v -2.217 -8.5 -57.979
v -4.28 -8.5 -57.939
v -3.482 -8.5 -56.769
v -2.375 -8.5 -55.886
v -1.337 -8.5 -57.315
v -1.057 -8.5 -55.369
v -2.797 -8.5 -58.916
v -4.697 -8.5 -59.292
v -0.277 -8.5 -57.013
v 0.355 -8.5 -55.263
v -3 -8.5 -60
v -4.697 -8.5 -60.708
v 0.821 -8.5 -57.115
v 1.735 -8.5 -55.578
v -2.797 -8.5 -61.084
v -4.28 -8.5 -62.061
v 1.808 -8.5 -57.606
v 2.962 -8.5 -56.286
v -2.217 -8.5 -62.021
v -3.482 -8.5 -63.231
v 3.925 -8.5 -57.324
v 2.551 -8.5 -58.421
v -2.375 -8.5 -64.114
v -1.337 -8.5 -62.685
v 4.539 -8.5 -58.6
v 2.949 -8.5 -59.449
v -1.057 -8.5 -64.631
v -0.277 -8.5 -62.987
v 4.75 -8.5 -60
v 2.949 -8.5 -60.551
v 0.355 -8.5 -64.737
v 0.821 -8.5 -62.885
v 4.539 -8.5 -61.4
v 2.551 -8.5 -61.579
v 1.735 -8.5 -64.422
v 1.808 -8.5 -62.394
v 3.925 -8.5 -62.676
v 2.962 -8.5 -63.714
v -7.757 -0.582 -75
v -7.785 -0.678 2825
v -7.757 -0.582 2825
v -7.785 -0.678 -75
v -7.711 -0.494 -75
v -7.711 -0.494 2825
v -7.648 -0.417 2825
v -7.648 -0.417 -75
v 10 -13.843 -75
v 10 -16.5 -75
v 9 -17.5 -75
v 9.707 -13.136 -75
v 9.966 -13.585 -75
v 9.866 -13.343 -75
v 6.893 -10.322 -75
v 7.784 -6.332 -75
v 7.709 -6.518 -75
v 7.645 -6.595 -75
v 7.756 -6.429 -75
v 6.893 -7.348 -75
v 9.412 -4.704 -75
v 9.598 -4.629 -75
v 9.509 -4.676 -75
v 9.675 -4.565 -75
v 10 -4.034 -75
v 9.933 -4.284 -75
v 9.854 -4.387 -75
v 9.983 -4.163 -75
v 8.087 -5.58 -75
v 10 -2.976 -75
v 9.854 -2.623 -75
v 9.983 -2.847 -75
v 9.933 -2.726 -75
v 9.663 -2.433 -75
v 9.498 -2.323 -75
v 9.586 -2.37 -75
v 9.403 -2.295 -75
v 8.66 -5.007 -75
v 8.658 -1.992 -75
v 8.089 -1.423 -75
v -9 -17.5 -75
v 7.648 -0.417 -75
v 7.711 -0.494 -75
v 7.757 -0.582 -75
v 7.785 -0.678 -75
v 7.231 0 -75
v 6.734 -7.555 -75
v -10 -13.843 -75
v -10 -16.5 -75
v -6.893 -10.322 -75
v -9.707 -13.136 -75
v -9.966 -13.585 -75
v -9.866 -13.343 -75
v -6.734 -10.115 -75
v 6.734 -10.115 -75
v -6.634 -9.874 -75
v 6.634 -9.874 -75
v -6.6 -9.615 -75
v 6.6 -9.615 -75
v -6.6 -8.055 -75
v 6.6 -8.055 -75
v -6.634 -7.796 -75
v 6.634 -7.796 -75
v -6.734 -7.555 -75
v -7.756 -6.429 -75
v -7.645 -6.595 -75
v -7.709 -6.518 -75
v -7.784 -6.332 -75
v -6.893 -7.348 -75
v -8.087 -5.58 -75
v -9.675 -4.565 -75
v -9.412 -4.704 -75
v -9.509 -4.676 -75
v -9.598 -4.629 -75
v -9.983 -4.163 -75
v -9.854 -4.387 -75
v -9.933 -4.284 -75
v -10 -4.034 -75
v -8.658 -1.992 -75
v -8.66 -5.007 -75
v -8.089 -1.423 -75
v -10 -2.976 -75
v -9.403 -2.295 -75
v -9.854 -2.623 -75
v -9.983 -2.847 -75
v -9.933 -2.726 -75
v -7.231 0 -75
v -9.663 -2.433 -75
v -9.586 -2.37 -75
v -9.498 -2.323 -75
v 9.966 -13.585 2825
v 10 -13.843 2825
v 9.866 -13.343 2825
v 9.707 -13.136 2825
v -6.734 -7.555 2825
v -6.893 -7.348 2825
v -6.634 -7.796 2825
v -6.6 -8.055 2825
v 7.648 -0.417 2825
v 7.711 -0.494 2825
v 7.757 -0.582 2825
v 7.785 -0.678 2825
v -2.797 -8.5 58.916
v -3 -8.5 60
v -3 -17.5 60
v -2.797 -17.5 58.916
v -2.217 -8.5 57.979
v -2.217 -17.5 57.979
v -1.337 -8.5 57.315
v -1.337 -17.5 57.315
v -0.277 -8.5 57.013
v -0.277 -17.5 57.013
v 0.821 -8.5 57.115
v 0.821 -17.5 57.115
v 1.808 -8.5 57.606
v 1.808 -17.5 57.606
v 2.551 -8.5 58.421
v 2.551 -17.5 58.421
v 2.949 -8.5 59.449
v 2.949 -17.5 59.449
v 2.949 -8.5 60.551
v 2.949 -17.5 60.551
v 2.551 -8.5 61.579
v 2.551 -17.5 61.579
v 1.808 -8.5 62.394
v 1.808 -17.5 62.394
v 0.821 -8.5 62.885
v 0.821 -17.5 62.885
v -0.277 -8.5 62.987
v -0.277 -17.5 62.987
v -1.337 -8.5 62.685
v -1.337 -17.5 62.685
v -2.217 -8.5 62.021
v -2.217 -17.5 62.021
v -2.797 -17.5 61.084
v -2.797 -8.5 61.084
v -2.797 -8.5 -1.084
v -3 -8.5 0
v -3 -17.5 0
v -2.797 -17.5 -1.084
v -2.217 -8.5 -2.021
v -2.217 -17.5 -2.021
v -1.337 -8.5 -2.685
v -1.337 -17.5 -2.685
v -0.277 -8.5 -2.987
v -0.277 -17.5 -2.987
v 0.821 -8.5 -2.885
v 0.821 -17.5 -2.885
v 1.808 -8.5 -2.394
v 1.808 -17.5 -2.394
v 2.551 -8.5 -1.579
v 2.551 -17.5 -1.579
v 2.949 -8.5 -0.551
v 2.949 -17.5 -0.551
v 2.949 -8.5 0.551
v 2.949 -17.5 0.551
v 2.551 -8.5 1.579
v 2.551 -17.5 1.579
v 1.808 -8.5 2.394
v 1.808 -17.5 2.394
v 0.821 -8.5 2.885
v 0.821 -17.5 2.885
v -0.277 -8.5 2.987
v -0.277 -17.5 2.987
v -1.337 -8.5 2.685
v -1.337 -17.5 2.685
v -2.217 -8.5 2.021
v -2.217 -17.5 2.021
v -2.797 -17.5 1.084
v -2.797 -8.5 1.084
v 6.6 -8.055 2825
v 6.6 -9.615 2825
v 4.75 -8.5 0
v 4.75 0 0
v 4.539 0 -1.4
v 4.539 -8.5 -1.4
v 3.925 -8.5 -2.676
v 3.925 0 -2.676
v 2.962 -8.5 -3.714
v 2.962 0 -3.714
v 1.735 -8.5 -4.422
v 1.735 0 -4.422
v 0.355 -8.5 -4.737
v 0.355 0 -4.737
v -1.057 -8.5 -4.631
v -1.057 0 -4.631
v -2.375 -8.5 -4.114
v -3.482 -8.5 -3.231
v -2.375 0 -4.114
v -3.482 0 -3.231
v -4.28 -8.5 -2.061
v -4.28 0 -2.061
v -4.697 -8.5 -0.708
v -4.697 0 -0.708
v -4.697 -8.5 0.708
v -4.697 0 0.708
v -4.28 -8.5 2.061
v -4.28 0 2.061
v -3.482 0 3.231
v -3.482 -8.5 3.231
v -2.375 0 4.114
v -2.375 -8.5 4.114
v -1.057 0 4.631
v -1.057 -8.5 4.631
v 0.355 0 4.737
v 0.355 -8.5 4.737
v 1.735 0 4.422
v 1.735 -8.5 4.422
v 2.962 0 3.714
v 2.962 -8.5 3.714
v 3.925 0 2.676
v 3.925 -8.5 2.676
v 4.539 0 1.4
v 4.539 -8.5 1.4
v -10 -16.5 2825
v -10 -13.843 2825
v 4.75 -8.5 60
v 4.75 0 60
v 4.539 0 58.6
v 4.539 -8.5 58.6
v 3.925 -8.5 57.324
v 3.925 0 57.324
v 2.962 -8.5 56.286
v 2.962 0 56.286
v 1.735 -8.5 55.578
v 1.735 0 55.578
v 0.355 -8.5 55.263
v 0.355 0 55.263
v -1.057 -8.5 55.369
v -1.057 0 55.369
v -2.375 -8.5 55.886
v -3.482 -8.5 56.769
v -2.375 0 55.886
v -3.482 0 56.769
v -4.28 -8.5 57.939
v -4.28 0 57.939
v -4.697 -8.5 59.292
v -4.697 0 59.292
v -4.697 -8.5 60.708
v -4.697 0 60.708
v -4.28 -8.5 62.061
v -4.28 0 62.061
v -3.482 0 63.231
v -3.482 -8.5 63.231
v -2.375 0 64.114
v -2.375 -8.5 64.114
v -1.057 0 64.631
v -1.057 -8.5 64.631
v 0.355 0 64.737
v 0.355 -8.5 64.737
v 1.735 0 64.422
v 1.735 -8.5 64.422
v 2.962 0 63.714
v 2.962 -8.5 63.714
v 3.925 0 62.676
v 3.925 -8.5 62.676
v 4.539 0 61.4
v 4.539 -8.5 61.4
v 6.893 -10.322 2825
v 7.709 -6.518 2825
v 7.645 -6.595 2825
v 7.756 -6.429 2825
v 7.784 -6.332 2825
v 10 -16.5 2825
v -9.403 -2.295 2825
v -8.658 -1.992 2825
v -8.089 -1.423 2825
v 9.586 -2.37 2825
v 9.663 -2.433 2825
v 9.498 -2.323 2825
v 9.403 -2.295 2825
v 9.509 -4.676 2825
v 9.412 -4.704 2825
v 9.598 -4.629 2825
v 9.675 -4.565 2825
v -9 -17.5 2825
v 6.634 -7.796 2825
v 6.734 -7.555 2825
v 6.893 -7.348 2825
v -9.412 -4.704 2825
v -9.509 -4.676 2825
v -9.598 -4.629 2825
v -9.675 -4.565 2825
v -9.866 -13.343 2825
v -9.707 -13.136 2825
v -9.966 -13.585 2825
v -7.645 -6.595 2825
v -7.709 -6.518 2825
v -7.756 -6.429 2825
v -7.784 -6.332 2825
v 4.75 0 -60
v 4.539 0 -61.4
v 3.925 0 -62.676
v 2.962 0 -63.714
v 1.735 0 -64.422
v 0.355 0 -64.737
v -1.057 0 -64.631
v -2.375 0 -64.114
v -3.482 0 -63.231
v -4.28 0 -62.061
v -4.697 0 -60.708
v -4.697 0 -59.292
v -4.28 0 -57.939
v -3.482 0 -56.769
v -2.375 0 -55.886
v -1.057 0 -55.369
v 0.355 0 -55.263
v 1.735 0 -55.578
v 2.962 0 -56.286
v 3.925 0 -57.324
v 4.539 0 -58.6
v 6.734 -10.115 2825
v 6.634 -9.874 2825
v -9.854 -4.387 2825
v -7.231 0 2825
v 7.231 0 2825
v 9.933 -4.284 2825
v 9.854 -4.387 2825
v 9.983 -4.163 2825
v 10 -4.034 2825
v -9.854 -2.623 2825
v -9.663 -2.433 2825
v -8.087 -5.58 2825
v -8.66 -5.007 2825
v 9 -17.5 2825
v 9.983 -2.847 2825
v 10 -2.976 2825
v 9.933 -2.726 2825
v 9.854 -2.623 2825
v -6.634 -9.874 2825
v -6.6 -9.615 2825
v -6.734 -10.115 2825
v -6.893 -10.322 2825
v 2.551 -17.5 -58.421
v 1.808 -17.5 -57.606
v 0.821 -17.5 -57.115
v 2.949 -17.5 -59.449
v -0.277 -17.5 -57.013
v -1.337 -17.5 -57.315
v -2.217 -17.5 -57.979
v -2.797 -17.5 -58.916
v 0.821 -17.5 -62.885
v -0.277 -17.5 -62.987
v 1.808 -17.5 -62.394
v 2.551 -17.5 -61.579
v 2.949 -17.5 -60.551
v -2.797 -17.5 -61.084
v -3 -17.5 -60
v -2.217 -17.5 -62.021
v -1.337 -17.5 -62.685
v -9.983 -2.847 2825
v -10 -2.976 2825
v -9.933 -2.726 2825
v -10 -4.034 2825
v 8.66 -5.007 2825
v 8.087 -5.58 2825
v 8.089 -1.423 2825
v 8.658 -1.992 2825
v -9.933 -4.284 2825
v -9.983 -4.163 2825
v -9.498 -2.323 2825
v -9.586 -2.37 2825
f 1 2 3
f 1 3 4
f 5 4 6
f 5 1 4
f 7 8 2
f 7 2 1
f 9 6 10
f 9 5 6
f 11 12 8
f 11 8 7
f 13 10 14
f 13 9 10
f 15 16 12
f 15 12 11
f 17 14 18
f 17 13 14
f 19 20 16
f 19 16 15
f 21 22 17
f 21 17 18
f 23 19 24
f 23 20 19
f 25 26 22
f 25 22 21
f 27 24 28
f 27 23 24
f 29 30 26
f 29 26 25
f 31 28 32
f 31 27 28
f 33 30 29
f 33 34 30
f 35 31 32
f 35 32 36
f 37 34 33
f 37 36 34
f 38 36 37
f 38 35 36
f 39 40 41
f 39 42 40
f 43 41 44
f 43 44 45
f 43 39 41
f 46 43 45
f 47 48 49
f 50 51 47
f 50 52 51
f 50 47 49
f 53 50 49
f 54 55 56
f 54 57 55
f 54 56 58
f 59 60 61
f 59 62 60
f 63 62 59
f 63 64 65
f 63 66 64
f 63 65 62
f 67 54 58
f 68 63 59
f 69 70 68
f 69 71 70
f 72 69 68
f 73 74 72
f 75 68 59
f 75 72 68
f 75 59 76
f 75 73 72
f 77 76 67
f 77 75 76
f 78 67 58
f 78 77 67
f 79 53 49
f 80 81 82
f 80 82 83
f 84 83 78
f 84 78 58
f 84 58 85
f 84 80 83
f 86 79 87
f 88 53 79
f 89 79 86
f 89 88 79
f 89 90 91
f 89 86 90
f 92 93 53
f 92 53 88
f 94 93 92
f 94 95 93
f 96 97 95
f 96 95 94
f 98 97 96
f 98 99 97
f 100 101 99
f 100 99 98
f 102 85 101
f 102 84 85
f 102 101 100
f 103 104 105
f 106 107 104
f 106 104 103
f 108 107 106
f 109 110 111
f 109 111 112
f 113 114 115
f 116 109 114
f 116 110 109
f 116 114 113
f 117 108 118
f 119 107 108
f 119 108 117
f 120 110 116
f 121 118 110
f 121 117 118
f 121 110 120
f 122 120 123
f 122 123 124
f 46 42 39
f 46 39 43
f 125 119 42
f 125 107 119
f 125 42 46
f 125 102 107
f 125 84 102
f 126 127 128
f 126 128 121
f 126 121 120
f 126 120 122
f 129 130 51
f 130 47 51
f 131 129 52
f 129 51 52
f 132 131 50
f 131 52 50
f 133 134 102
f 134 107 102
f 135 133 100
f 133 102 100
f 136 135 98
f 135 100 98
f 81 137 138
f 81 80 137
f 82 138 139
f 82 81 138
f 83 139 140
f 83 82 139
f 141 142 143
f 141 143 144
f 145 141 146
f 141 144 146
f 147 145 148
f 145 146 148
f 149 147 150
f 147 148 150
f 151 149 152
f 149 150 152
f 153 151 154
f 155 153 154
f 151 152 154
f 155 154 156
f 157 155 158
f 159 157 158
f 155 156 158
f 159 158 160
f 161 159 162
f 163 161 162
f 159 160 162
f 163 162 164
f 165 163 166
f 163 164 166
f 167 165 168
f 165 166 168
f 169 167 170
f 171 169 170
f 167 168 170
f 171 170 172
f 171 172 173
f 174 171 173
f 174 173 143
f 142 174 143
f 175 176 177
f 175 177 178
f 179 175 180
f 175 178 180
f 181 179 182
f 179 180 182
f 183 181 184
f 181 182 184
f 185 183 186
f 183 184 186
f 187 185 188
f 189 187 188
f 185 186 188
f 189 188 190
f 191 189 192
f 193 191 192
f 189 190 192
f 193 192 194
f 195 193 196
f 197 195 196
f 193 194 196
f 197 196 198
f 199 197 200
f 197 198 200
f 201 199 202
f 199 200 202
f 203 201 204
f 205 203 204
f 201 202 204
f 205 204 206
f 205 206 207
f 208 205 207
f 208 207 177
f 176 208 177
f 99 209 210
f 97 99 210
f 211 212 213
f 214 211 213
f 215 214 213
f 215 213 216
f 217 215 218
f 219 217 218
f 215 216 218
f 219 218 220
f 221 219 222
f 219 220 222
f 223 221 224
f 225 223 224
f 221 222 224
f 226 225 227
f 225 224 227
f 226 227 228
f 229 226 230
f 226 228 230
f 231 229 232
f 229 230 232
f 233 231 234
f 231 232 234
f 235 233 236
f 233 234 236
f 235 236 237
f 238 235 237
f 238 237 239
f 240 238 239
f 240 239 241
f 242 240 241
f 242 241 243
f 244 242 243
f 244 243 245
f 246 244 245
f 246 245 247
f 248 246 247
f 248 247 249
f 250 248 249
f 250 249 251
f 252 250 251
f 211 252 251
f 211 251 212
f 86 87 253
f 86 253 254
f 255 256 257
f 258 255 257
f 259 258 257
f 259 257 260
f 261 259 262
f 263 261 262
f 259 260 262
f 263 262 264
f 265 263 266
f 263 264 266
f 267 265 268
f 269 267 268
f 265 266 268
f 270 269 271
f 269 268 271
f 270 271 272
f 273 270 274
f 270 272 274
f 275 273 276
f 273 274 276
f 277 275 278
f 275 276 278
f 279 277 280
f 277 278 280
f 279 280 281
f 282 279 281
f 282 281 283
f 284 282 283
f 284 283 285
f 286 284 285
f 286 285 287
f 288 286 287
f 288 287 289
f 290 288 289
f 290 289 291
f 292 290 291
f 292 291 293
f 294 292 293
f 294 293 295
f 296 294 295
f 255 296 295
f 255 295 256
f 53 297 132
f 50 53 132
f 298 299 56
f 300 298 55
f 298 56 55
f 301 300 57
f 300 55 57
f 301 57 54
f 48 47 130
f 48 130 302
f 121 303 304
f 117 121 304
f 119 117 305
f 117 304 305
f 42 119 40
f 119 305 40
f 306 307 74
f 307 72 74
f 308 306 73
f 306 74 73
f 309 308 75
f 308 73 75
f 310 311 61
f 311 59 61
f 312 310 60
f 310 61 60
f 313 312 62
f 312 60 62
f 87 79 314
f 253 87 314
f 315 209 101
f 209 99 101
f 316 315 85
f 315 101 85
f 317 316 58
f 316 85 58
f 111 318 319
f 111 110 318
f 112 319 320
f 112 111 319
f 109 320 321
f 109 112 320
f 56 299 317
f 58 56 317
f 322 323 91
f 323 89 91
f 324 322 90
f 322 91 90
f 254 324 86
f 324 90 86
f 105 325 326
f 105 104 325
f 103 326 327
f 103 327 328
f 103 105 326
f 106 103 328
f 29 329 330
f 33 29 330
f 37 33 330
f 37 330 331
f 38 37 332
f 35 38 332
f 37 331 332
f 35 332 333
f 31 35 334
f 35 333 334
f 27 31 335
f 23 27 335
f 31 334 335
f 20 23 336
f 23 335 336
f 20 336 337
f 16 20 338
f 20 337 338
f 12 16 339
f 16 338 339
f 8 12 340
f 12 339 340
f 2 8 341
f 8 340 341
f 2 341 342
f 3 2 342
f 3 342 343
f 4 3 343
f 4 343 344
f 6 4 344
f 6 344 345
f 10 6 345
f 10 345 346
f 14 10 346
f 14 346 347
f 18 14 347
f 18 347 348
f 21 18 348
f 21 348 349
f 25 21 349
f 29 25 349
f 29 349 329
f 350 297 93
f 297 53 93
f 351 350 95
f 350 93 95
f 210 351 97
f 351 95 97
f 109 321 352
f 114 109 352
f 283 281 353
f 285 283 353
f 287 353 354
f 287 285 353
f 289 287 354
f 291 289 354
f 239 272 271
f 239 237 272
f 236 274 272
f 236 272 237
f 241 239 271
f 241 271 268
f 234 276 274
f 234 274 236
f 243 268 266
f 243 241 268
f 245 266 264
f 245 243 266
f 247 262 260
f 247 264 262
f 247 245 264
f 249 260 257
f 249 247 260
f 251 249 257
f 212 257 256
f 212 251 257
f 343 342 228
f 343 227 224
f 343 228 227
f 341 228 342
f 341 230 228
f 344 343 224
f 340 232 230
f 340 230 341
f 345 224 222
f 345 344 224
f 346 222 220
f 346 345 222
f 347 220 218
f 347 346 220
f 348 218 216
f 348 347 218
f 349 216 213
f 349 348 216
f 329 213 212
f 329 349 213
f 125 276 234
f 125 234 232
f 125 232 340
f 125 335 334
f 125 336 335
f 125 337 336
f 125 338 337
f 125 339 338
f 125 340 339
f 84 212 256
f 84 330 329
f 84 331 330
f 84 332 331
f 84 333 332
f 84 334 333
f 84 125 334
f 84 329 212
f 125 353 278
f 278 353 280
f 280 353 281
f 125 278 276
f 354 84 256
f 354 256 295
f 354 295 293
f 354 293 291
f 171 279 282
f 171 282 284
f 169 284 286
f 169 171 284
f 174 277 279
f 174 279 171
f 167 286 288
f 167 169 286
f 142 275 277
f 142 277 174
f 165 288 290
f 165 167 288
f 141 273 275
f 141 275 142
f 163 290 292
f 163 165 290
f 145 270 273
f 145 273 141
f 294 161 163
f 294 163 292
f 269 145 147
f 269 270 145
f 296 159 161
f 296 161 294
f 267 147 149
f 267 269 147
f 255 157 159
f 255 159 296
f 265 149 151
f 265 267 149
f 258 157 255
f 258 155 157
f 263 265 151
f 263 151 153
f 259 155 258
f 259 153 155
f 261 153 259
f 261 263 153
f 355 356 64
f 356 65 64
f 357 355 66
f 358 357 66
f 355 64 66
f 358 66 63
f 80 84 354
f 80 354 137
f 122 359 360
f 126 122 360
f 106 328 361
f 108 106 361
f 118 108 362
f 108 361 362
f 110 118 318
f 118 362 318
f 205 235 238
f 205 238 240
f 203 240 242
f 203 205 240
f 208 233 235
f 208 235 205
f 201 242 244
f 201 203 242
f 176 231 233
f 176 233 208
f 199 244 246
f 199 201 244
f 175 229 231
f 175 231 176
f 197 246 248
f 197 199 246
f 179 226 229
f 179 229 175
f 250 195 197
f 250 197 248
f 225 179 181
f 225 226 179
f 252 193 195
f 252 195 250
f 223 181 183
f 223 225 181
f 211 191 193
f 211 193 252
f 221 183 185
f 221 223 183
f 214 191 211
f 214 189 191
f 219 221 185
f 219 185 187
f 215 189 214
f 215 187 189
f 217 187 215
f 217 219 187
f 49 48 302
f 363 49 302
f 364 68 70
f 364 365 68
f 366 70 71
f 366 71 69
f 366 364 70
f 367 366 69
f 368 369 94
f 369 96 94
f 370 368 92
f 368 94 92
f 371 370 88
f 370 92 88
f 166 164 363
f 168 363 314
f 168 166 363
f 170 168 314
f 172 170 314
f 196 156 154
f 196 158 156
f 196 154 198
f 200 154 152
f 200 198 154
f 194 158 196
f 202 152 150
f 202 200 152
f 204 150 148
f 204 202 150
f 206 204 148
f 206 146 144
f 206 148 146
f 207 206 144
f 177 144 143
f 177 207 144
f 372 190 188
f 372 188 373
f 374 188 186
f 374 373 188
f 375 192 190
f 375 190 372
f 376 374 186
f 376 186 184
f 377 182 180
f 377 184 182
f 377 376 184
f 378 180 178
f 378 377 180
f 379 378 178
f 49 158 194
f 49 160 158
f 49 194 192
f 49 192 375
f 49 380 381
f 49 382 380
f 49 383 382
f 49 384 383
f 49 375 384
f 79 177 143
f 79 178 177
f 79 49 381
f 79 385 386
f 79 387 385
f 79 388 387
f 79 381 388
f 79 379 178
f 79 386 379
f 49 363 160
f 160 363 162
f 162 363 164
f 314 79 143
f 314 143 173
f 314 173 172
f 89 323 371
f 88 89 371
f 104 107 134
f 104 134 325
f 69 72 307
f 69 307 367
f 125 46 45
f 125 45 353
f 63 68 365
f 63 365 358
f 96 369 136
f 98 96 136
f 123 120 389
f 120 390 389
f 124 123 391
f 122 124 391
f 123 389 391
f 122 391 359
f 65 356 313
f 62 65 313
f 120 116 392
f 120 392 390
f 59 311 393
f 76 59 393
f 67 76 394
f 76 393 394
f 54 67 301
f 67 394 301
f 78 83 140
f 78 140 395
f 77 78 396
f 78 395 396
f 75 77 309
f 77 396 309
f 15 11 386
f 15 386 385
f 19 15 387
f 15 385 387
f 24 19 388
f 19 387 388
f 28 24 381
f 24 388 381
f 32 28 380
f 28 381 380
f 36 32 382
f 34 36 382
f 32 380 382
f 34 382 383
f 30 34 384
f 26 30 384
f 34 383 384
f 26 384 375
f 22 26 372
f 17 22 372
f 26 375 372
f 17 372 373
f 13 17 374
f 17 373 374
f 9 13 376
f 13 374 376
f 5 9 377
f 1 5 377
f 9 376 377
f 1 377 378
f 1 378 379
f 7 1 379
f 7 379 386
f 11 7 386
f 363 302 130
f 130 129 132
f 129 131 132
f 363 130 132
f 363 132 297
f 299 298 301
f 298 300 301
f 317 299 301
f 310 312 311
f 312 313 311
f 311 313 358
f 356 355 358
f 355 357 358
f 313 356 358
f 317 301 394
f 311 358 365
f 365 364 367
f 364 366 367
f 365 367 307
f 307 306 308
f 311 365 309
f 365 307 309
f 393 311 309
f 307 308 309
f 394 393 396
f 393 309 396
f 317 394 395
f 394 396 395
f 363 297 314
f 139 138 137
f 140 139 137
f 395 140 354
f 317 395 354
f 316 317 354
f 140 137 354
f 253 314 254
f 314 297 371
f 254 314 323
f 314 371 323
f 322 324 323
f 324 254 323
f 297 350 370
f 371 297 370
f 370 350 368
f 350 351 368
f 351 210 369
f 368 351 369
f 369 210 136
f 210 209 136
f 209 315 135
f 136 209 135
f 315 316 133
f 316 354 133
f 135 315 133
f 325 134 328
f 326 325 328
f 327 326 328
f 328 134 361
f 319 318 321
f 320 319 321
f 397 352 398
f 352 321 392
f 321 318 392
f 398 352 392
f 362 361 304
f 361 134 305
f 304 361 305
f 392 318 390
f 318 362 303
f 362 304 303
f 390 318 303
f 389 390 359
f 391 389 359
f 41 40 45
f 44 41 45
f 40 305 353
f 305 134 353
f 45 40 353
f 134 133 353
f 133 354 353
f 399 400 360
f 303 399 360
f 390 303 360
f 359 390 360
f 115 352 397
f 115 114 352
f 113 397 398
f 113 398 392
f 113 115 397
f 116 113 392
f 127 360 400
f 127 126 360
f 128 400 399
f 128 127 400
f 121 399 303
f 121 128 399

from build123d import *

# Parameters (mm, degrees)
ESTRUSIONE_ESTRUSIONE1_DEPTH = 2900
TAGLIO_ESTRUSIONE1_DEPTH     = 2901.070042258
TAGLIO_ESTRUSIONE2_REACH     = 2902.07
TAGLIO_ESTRUSIONE3_DEPTH     = 2901.070042258
TAGLIO_ESTRUSIONE4_DEPTH     = 2901.070042258
TAGLIO_ESTRUSIONE5_REACH     = 2902.07
TAGLIO_ESTRUSIONE6_DEPTH     = 2901.070042258
SFORMO1_ANGLE                = 44.999999999
SFORMO2_ANGLE                = 44.999999999
FORO1_D                      = 6
FORO1_CBORE_D                = 9.5
FORO1_CBORE_DEPTH            = 8.5
SMUSSO1_SIZE                 = 1
RACCORDO1_R                  = 0.5
RACCORDO2_R                  = 1


with BuildPart() as part:
    # Schizzo1 → Estrusione-Estrusione1 (new body)
    with BuildSketch(Plane(origin=(0, 0, -75), x_dir=(-1, 0, 0), z_dir=(0, 0, -1))):
        Polygon((-7.230720611, 0), (-10, -2.769279389), (-10, -17.5), (10, -17.5), (10, -2.769279389), (7.230720611, 0), align=None)
    extrude(amount=-ESTRUSIONE_ESTRUSIONE1_DEPTH)

    # Schizzo2 → Taglio-Estrusione1 (cut, through all)
    with BuildSketch(Plane.XY.offset(2825)):
        Polygon((10, -4.240720611), (6.6, -7.640720611), (6.6, -13.429279389), (10, -13.429279389), align=None)
    extrude(amount=-TAGLIO_ESTRUSIONE1_DEPTH, mode=Mode.SUBTRACT)

    # Schizzo3 → Taglio-Estrusione2 (cut, up to next)
    with BuildSketch(Plane.XY.offset(2825), mode=Mode.PRIVATE) as taglio_estrusione2_sk1:
        with BuildLine():
            Line((7.762144254, -6.478576357), (9.558632757, -4.682087854))
            ThreePointArc((9.558632757, -4.682087854), (8.344607784, -5.264551384), (7.762144254, -6.478576357))
        make_face()
    taglio_estrusione2_tool1 = extrude(taglio_estrusione2_sk1.sketch, amount=-TAGLIO_ESTRUSIONE2_REACH, mode=Mode.PRIVATE) & part.part
    add(taglio_estrusione2_tool1.solids().sort_by_distance((8.532804, -5.452748, 2825))[0], mode=Mode.SUBTRACT)

    # Schizzo4 → Taglio-Estrusione3 (cut, through all)
    with BuildSketch(Plane.XY.offset(2825)):
        Polygon((-10, -13.429279389), (-6.6, -13.429279389), (-6.6, -7.640720611), (-10, -4.240720611), align=None)
    extrude(amount=-TAGLIO_ESTRUSIONE3_DEPTH, mode=Mode.SUBTRACT)

    # Schizzo5 → Taglio-Estrusione4 (cut, through all)
    with BuildSketch(Plane.XY.offset(2825)):
        with BuildLine():
            Line((-9.558632757, -4.682087854), (-7.762144254, -6.478576357))
            ThreePointArc((-7.762144254, -6.478576357), (-8.344607784, -5.264551384), (-9.558632757, -4.682087854))
        make_face()
    extrude(amount=-TAGLIO_ESTRUSIONE4_DEPTH, mode=Mode.SUBTRACT)

    # Schizzo6 → Taglio-Estrusione5 (cut, up to next)
    with BuildSketch(Plane.XY.offset(2825), mode=Mode.PRIVATE) as taglio_estrusione5_sk1:
        with BuildLine():
            Line((-7.763380653, -0.532660042), (-9.547640358, -2.316919747))
            ThreePointArc((-9.547640358, -2.316919747), (-8.344607784, -1.735692616), (-7.763380653, -0.532660042))
        make_face()
    taglio_estrusione5_tool1 = extrude(taglio_estrusione5_sk1.sketch, amount=-TAGLIO_ESTRUSIONE5_REACH, mode=Mode.PRIVATE) & part.part
    add(taglio_estrusione5_tool1.solids().sort_by_distance((-8.529918, -1.550383, 2825))[0], mode=Mode.SUBTRACT)

    # Schizzo7 → Taglio-Estrusione6 (cut, through all)
    with BuildSketch(Plane.XY.offset(2825)):
        with BuildLine():
            Line((9.547640358, -2.316919747), (7.763380653, -0.532660042))
            ThreePointArc((7.763380653, -0.532660042), (8.344607784, -1.735692616), (9.547640358, -2.316919747))
        make_face()
    extrude(amount=-TAGLIO_ESTRUSIONE6_DEPTH, mode=Mode.SUBTRACT)

    # Sformo1
    sformo1_faces = [part.faces().sort_by_distance(p)[0] for p in [
        (8.3, -13.429279389, 1375),
    ]]
    draft(sformo1_faces, Plane(origin=(10, -2.769279389, 2825), x_dir=(0, 0, 1), z_dir=(1, 0, 0)), SFORMO1_ANGLE)

    # Sformo2
    sformo2_faces = [part.faces().sort_by_distance(p)[0] for p in [
        (-8.3, -13.429279389, 1375),
    ]]
    draft(sformo2_faces, Plane(origin=(-10, -17.5, 2825), x_dir=(0, -1, 0), z_dir=(-1, 0, 0)), SFORMO2_ANGLE)

    # Foro1 (through all)
    with Locations(Plane(origin=(0, 0, 0), x_dir=(1, 0, 0), z_dir=(0, 1, 0))):
        with Locations((0, 60), (0, 0), (0, -60)):
            CounterBoreHole(FORO1_D / 2, FORO1_CBORE_D / 2, FORO1_CBORE_DEPTH)

    # Smusso1
    smusso1_edges = [part.edges().sort_by_distance(p)[0] for p in [
        (-10, -17.5, 1375),
        (10, -17.5, 1375),
    ]]
    chamfer(smusso1_edges, length=SMUSSO1_SIZE)

    # Raccordo1
    raccordo1_edges = [part.edges().sort_by_distance(p)[0] for p in [
        (-10, -2.769279389, 1375),
        (10, -2.769279389, 1375),
        (10, -4.240720611, 1375),
        (7.762144254, -6.478576357, 1375),
        (9.558632757, -4.682087854, 1375),
        (-10, -4.240720611, 1375),
        (-9.558632757, -4.682087854, 1375),
        (-7.762144254, -6.478576357, 1375),
        (-7.763380653, -0.532660042, 1375),
        (-9.547640358, -2.316919747, 1375),
        (9.547640358, -2.316919747, 1375),
        (7.763380653, -0.532660042, 1375),
    ]]
    fillet(raccordo1_edges, radius=RACCORDO1_R)

    # Raccordo2
    raccordo2_edges = [part.edges().sort_by_distance(p)[0] for p in [
        (10, -13.429279389, 1375),
        (6.6, -10.029279389, 1375),
        (6.6, -7.640720611, 1375),
        (-10, -13.429279389, 1375),
        (-6.6, -7.640720611, 1375),
        (-6.6, -10.029279389, 1375),
    ]]
    fillet(raccordo2_edges, radius=RACCORDO2_R)


solid = part.part
